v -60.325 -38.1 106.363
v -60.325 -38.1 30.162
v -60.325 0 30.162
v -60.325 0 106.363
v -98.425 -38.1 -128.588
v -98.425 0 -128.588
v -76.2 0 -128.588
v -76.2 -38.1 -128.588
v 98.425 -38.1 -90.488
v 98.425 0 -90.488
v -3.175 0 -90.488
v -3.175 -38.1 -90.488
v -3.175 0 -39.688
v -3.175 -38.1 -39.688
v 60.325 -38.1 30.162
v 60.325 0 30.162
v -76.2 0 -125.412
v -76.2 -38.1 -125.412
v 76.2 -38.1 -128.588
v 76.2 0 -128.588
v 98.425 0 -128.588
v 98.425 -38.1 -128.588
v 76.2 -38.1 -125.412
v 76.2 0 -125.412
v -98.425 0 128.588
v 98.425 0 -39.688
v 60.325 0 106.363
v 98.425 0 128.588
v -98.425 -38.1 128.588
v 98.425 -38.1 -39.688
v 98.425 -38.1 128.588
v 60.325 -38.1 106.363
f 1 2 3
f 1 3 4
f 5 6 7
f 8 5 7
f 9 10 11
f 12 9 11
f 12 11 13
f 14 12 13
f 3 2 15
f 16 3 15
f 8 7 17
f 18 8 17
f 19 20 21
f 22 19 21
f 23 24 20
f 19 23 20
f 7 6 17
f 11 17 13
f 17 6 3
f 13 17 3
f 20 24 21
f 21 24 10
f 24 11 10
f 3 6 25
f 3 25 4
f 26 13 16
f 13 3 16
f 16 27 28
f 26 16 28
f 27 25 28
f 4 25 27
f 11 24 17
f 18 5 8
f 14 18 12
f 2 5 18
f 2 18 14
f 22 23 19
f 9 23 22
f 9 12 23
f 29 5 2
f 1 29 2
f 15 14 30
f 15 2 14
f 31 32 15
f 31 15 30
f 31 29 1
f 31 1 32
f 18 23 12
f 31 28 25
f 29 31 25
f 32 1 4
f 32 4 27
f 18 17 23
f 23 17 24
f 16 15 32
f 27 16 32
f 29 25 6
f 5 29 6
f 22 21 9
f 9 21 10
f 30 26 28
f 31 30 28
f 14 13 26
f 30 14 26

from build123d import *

# Parameters (mm, degrees)
F1_DEPTH = 38.1
F2_W     = 120.65
F2_H     = 76.2
F3_DEPTH = 38.101


with BuildPart() as f1:
    # F0 (on Front) → F1 (new body)
    with BuildSketch(Plane.XZ):
        Polygon((98.425, 128.5875), (-98.425, 128.5875), (-98.425, -128.5875), (-76.2, -128.5875), (-76.2, -125.4125), (76.2, -125.4125), (76.2, -128.5875), (98.425, -128.5875), (98.425, -90.4875), (-3.175, -90.4875), (-3.175, -39.6875), (98.425, -39.6875), align=None)
    extrude(amount=F1_DEPTH)

    # F2 (on face) → F3 (cut, through all)
    with BuildSketch(Plane.XZ.offset(38.1)):
        with Locations((0, 68.2625)):
            Rectangle(F2_W, F2_H)
    extrude(amount=-F3_DEPTH, mode=Mode.SUBTRACT)


solid = f1.part
